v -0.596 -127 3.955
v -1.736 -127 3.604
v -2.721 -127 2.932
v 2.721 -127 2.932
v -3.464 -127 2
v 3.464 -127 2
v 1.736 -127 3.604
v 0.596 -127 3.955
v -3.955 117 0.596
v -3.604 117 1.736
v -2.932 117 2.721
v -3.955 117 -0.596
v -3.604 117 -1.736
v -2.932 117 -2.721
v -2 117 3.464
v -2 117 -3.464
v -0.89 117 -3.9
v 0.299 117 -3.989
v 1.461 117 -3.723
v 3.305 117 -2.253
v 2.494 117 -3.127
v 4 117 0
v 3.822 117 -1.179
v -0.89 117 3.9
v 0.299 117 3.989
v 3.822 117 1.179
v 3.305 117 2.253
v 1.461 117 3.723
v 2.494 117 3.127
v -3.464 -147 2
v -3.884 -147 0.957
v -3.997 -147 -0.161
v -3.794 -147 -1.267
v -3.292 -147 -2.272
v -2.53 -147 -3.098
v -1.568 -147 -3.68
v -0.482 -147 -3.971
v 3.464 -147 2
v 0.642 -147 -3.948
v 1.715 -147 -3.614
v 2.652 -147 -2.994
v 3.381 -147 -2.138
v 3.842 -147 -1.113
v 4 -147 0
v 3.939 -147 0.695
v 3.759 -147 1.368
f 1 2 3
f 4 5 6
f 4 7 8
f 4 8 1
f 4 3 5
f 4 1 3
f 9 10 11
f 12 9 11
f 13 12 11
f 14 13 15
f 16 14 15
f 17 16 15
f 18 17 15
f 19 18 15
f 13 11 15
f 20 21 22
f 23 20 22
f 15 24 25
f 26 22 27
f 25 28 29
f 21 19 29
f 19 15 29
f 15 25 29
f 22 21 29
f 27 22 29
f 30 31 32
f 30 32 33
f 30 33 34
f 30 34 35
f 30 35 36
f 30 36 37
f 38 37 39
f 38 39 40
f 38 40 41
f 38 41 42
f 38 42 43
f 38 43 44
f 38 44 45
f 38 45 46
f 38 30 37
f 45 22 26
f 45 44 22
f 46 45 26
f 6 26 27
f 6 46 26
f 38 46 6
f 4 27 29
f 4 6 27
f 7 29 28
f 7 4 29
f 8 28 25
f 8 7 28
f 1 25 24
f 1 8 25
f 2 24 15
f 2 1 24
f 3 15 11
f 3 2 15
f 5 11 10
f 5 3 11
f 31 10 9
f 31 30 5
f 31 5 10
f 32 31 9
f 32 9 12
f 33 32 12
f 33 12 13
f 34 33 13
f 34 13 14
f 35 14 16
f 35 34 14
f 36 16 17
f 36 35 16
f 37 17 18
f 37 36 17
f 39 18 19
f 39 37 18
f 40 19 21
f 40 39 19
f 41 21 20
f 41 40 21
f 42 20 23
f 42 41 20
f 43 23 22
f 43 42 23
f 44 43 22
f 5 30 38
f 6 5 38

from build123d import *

# Parameters (mm, degrees)
F0_R     = 4
F1_DEPTH = 147
F3_DEPTH = 20
F4_DEPTH = 30


with BuildPart() as f1:
    # F0 (on Front) → F1 (new body, symmetric)
    with BuildSketch(Plane.XZ):
        Circle(F0_R)
    extrude(amount=F1_DEPTH, both=True)

    # F2 (on face) → F3 (cut)
    with BuildSketch(Plane.XZ.offset(147)):
        with BuildLine():
            Line((-3.4641016151, 2), (3.4641016151, 2))
            ThreePointArc((3.4641016151, 2), (0, 4), (-3.4641016151, 2))
        make_face()
    extrude(amount=-F3_DEPTH, mode=Mode.SUBTRACT)

    # F4 (cut): a face of the model
    f4_faces = [f1.faces().sort_by_distance(p)[0] for p in [
        (0, 147, 0),
    ]]
    extrude(f4_faces, amount=-F4_DEPTH, mode=Mode.SUBTRACT)


solid = f1.part
